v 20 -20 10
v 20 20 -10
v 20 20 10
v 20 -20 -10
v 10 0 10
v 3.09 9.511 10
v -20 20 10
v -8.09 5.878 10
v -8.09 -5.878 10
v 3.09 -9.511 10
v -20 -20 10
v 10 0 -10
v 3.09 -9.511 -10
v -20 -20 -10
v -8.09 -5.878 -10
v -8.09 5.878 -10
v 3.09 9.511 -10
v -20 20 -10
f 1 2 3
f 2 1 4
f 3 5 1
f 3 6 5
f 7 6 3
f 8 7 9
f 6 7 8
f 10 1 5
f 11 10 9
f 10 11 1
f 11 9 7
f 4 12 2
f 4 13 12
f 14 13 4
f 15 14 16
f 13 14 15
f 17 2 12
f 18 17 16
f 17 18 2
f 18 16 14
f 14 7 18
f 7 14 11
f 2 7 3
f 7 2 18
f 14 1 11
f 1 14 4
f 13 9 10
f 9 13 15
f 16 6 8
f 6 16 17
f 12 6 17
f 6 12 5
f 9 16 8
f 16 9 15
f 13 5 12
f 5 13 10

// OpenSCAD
s = 20;

difference()
{
cube([2*s, 2*s, s], center = true);
cylinder(h=5*s, r = s/2, center = true, $fn=5);
}
